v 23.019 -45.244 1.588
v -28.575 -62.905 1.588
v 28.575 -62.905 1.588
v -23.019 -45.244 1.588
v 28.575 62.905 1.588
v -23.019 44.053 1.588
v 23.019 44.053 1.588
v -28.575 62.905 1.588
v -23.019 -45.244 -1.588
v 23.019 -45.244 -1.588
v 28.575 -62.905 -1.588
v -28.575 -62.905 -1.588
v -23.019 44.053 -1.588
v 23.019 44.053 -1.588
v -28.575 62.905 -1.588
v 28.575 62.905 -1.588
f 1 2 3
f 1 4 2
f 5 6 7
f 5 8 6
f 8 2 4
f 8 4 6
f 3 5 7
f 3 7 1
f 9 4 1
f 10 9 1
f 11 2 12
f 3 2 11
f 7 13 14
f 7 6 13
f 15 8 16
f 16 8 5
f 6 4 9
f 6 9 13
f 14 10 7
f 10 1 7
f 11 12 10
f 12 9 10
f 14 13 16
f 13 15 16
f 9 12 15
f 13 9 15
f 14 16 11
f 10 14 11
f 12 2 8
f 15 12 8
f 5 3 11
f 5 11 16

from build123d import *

# Parameters (mm, degrees)
SKETCH1_W           = 57.15
SKETCH1_H           = 125.809375
SKETCH1_W_2         = 46.0375
SKETCH1_H_2         = 89.296875
BOSS_EXTRUDE1_DEPTH = 1.5875


with BuildPart() as part:
    # Sketch1 → Boss-Extrude1 (new, symmetric)
    with BuildSketch(Plane.XY):
        Rectangle(SKETCH1_W, SKETCH1_H)
        with Locations((0, -0.5953125)):
            Rectangle(SKETCH1_W_2, SKETCH1_H_2, mode=Mode.SUBTRACT)
    extrude(amount=BOSS_EXTRUDE1_DEPTH, both=True)


solid = part.part
